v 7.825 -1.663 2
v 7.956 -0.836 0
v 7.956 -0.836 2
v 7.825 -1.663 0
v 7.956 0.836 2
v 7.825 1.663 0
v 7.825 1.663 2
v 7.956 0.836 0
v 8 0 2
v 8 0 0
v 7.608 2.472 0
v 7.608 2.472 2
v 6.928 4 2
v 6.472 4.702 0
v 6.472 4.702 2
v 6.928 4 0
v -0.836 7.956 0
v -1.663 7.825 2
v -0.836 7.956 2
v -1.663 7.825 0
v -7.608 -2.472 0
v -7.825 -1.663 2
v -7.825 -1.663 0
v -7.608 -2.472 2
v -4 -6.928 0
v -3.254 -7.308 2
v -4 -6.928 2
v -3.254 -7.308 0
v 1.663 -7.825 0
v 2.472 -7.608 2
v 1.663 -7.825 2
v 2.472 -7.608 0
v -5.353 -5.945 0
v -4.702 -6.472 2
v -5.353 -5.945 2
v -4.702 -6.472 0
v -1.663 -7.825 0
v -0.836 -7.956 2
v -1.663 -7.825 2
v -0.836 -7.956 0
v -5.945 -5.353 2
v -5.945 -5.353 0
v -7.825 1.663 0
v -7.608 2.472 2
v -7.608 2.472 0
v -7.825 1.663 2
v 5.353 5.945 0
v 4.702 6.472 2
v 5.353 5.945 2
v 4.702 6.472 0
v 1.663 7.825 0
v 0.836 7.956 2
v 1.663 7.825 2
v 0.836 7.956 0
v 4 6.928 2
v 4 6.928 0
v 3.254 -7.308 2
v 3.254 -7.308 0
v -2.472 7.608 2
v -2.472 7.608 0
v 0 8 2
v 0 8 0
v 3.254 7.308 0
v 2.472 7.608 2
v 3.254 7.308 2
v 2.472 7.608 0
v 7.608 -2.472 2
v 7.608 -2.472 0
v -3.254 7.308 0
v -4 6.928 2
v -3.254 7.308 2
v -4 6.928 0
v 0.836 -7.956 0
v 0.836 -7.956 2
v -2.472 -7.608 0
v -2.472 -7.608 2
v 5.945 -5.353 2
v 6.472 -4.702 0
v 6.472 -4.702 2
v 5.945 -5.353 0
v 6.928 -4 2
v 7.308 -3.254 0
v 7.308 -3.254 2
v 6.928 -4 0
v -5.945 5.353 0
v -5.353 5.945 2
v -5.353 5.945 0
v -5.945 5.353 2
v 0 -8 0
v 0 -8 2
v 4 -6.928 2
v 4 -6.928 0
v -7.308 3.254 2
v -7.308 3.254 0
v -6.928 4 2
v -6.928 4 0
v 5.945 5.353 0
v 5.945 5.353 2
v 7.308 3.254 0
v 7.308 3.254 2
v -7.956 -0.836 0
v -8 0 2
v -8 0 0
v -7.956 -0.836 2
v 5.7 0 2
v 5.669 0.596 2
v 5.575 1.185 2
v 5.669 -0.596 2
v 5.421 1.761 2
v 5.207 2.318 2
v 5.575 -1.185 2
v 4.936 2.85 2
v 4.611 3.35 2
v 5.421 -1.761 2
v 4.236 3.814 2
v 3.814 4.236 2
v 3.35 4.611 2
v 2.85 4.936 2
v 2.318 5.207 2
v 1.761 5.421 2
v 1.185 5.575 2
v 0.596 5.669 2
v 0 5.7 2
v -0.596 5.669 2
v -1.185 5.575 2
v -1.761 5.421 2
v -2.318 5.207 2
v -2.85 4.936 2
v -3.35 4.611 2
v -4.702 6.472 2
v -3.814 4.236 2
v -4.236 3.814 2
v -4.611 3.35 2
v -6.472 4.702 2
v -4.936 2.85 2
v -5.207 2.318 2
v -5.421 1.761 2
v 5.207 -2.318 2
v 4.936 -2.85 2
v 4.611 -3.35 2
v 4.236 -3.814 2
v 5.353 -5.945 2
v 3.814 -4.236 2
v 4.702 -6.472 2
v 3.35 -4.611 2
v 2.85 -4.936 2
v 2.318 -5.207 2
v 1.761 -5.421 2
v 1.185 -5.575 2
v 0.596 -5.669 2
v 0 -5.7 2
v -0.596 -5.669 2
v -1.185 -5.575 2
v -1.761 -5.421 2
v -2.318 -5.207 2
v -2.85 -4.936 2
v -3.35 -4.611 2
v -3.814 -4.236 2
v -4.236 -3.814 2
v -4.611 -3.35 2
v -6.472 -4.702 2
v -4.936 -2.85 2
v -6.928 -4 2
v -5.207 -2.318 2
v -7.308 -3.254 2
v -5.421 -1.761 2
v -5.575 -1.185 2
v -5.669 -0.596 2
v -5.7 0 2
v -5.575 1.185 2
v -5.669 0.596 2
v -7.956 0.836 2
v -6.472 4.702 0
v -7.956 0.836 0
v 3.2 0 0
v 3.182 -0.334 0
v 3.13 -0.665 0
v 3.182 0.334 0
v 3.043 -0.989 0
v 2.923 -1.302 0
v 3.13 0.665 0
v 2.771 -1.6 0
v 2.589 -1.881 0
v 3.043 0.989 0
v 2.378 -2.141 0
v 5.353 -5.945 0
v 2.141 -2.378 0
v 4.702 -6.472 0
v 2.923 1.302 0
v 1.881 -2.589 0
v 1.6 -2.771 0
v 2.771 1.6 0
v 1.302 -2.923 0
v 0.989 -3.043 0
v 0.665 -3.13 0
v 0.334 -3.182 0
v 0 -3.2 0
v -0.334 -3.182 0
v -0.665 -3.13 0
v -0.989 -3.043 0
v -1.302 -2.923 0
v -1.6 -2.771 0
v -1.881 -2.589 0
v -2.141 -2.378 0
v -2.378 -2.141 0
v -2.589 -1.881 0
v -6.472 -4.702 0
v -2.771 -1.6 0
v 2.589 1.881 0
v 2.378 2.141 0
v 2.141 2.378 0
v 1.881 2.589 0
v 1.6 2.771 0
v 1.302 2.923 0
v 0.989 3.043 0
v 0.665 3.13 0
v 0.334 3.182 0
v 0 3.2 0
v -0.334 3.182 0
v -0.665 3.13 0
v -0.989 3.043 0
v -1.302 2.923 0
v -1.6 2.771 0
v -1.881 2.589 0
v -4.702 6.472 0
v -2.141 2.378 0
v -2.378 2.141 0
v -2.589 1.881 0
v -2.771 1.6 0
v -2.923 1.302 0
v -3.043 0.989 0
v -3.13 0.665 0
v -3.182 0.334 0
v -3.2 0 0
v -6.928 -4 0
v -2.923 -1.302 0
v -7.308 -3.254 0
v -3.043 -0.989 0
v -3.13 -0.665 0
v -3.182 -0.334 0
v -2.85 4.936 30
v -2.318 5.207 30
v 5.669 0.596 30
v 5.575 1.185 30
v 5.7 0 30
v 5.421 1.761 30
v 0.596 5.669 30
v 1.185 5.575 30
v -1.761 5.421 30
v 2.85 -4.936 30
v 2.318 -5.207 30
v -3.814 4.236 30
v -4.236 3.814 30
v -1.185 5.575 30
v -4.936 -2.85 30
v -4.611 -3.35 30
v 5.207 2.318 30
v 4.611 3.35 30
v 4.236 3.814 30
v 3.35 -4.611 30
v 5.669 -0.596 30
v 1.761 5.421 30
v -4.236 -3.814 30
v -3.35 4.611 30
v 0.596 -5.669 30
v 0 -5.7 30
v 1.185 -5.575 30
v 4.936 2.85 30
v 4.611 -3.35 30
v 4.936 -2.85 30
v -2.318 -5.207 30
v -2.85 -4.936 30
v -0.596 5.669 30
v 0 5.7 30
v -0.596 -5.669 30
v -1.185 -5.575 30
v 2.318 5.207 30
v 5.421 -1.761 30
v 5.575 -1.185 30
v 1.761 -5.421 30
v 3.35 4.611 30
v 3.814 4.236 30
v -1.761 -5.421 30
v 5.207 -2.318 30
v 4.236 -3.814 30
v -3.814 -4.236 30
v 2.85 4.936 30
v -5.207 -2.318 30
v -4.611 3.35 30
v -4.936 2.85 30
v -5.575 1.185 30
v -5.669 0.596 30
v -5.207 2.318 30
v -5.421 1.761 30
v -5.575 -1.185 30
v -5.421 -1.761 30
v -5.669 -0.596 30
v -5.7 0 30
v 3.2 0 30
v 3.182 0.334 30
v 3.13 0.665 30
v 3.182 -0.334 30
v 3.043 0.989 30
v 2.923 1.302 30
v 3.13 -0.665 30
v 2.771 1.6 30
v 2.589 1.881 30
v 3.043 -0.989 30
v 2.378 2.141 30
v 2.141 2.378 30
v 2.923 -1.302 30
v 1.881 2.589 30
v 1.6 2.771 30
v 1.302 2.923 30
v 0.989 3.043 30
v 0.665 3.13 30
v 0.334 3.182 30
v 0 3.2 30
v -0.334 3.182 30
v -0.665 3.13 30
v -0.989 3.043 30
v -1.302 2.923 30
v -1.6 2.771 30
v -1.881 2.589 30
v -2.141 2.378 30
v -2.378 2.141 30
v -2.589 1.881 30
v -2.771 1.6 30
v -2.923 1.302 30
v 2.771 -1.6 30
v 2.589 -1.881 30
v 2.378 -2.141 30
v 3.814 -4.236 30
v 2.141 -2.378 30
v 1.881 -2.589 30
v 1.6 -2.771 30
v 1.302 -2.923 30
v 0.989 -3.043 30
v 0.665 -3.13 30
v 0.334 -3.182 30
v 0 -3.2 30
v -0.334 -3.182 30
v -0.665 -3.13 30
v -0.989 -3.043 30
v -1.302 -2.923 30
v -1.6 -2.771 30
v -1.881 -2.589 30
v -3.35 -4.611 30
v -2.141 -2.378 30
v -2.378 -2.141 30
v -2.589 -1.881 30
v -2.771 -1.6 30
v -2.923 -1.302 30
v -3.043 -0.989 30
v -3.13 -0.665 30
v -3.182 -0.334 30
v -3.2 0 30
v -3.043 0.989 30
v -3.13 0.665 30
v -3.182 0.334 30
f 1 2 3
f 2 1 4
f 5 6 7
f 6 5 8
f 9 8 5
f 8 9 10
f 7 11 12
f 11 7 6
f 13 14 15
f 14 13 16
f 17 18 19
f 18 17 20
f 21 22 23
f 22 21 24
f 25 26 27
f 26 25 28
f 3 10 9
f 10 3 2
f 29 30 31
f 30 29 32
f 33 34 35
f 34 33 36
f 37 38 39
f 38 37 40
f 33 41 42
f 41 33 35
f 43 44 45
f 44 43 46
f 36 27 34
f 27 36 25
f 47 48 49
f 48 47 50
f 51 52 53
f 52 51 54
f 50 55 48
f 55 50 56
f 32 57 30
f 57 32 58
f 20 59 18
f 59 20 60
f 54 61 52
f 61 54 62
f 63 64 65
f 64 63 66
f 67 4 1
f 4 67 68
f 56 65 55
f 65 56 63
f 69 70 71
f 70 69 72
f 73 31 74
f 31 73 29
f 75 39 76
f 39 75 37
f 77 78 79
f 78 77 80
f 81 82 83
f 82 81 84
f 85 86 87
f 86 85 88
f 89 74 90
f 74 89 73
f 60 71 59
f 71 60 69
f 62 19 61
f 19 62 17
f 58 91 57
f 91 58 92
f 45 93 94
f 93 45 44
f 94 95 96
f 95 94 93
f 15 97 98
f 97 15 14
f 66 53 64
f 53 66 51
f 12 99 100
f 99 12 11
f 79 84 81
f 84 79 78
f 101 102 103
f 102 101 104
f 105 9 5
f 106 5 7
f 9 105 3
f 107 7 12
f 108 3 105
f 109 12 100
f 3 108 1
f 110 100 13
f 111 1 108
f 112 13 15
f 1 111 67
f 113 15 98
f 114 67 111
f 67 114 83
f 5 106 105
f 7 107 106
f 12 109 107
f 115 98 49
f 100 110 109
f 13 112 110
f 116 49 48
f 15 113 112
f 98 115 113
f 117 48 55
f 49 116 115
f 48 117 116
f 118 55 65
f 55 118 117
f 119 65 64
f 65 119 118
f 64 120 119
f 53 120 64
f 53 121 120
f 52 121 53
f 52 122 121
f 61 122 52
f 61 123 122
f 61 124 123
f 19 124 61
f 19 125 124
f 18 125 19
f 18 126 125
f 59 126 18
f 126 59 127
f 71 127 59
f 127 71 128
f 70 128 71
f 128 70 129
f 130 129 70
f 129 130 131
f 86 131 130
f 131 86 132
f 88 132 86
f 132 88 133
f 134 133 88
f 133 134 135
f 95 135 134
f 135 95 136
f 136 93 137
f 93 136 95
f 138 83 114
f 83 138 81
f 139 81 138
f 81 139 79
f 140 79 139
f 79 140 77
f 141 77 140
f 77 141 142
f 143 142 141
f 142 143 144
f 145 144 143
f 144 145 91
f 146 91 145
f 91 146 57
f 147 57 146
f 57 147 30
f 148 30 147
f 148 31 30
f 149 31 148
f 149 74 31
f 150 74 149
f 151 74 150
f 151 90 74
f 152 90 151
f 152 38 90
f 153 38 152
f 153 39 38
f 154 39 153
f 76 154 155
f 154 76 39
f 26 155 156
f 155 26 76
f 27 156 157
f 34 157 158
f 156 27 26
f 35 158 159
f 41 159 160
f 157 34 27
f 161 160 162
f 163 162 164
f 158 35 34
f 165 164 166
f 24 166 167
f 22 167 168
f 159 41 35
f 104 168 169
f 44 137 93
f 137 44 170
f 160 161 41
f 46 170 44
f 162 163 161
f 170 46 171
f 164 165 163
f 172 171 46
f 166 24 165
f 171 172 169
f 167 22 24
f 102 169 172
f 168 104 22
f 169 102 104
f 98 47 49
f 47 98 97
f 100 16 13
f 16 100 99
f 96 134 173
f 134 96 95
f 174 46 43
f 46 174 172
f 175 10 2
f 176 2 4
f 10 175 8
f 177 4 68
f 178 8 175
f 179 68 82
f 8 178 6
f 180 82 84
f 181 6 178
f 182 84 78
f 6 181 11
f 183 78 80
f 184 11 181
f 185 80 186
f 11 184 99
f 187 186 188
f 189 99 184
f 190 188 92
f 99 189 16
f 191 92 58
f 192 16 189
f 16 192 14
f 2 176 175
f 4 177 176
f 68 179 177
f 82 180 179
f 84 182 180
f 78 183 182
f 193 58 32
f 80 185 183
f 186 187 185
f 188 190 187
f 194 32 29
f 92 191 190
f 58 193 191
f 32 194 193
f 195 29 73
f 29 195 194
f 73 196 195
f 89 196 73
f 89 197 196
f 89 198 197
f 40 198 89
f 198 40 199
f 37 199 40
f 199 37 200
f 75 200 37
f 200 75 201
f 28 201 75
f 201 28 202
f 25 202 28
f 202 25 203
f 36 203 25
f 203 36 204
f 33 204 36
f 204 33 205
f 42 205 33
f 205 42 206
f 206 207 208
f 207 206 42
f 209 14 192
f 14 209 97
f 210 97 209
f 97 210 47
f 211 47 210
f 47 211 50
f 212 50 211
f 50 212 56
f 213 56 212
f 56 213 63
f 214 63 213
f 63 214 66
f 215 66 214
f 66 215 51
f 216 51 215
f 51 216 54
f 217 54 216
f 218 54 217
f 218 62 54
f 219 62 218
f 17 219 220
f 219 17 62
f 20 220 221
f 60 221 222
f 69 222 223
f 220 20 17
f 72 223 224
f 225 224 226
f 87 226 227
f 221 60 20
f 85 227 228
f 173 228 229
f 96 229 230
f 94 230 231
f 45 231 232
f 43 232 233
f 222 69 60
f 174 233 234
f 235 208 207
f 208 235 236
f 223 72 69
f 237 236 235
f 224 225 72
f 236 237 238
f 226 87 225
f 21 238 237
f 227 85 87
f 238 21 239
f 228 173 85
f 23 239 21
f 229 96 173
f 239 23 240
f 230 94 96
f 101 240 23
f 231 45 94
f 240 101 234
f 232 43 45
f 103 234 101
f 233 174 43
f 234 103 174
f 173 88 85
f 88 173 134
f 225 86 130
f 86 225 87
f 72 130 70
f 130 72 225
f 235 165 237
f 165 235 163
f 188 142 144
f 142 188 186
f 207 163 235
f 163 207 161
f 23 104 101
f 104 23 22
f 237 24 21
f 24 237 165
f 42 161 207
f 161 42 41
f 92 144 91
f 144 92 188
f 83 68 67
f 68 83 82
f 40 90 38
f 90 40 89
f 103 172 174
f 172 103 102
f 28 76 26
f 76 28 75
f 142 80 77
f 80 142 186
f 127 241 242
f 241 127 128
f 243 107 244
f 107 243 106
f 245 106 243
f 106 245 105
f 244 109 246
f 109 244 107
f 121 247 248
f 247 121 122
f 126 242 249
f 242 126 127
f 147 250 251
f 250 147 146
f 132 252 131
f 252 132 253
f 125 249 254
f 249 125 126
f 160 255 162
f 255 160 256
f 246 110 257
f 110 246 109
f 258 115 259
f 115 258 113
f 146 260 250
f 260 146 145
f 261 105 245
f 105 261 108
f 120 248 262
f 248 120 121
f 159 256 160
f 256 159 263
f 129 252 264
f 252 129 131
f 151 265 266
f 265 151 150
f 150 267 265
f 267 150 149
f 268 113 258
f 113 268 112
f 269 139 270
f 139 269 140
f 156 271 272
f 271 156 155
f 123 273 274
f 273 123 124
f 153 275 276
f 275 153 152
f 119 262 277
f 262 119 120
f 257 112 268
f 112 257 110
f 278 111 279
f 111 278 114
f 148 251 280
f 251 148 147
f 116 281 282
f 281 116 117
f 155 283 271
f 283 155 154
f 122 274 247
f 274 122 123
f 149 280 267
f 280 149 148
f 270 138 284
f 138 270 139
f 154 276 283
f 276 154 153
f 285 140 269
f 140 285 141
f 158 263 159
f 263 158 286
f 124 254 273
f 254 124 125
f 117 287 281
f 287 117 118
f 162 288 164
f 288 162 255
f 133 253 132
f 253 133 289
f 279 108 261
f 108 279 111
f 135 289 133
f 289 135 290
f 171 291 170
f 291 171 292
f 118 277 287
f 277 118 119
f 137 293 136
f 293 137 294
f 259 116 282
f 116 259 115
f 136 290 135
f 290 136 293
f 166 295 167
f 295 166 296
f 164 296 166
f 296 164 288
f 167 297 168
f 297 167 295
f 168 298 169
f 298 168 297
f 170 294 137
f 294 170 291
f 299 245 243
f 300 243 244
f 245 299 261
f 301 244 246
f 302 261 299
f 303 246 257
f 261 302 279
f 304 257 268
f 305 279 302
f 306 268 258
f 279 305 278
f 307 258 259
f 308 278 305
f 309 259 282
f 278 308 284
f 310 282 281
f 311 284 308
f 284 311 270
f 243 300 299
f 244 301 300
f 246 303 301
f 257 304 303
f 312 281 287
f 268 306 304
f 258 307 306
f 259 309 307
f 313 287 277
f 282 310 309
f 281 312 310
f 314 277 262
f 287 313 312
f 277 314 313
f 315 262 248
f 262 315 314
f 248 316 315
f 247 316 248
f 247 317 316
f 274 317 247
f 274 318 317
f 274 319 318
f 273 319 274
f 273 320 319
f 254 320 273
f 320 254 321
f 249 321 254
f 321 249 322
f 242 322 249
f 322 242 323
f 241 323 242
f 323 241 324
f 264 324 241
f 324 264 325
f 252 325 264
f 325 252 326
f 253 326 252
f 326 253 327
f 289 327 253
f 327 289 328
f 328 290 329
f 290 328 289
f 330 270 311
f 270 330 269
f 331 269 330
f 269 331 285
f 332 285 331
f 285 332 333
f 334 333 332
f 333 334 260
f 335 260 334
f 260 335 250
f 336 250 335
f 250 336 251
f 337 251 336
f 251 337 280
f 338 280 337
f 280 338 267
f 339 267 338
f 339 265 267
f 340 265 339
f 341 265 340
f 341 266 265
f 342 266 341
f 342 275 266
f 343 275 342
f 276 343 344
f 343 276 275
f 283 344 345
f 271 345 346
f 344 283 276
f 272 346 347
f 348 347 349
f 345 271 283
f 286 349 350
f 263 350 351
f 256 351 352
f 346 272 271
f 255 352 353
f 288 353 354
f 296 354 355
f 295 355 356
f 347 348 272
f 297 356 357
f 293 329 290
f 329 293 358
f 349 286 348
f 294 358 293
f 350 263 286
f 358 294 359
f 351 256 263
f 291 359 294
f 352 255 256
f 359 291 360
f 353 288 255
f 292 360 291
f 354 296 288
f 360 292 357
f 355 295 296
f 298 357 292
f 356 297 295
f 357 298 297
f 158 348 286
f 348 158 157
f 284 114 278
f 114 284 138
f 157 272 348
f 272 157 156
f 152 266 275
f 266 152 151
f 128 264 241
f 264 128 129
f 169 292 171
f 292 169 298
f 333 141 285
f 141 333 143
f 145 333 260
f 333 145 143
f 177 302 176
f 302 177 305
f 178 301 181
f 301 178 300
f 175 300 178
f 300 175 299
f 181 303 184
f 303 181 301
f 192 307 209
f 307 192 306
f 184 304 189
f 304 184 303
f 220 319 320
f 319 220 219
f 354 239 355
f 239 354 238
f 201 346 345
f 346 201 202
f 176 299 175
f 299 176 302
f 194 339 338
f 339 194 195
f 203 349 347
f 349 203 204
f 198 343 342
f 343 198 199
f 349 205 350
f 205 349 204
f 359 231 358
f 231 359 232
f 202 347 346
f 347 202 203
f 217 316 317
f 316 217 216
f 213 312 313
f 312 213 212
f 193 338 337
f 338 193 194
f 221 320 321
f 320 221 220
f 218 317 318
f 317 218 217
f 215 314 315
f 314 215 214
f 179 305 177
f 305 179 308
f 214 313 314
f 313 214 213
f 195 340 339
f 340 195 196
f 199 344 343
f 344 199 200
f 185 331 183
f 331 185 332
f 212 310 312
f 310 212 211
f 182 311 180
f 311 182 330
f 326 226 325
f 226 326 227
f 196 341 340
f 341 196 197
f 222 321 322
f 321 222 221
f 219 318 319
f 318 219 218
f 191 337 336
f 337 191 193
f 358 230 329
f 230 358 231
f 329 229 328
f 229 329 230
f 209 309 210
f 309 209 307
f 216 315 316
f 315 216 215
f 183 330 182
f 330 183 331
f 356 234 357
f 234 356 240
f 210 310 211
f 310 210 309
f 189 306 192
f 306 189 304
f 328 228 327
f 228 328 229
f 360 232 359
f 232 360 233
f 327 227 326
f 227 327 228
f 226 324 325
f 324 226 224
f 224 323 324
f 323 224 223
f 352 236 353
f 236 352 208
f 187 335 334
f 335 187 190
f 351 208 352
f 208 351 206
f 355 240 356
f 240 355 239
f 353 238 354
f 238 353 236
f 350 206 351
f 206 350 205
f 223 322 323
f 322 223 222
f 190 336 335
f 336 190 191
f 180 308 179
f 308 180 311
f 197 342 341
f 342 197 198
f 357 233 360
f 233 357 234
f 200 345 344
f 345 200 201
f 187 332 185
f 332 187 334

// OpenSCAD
// PCB standoff with mounting base.
$fn = 60;
eps = 0.02;
thread_d = 6.4;
base_d = 16;
height = 30;
body_d = thread_d+5;
difference() {
    union() { cylinder(d=base_d,h=2); cylinder(d=body_d,h=height); }
    translate([0,0,-eps]) cylinder(d=thread_d,h=height+2*eps);
}
